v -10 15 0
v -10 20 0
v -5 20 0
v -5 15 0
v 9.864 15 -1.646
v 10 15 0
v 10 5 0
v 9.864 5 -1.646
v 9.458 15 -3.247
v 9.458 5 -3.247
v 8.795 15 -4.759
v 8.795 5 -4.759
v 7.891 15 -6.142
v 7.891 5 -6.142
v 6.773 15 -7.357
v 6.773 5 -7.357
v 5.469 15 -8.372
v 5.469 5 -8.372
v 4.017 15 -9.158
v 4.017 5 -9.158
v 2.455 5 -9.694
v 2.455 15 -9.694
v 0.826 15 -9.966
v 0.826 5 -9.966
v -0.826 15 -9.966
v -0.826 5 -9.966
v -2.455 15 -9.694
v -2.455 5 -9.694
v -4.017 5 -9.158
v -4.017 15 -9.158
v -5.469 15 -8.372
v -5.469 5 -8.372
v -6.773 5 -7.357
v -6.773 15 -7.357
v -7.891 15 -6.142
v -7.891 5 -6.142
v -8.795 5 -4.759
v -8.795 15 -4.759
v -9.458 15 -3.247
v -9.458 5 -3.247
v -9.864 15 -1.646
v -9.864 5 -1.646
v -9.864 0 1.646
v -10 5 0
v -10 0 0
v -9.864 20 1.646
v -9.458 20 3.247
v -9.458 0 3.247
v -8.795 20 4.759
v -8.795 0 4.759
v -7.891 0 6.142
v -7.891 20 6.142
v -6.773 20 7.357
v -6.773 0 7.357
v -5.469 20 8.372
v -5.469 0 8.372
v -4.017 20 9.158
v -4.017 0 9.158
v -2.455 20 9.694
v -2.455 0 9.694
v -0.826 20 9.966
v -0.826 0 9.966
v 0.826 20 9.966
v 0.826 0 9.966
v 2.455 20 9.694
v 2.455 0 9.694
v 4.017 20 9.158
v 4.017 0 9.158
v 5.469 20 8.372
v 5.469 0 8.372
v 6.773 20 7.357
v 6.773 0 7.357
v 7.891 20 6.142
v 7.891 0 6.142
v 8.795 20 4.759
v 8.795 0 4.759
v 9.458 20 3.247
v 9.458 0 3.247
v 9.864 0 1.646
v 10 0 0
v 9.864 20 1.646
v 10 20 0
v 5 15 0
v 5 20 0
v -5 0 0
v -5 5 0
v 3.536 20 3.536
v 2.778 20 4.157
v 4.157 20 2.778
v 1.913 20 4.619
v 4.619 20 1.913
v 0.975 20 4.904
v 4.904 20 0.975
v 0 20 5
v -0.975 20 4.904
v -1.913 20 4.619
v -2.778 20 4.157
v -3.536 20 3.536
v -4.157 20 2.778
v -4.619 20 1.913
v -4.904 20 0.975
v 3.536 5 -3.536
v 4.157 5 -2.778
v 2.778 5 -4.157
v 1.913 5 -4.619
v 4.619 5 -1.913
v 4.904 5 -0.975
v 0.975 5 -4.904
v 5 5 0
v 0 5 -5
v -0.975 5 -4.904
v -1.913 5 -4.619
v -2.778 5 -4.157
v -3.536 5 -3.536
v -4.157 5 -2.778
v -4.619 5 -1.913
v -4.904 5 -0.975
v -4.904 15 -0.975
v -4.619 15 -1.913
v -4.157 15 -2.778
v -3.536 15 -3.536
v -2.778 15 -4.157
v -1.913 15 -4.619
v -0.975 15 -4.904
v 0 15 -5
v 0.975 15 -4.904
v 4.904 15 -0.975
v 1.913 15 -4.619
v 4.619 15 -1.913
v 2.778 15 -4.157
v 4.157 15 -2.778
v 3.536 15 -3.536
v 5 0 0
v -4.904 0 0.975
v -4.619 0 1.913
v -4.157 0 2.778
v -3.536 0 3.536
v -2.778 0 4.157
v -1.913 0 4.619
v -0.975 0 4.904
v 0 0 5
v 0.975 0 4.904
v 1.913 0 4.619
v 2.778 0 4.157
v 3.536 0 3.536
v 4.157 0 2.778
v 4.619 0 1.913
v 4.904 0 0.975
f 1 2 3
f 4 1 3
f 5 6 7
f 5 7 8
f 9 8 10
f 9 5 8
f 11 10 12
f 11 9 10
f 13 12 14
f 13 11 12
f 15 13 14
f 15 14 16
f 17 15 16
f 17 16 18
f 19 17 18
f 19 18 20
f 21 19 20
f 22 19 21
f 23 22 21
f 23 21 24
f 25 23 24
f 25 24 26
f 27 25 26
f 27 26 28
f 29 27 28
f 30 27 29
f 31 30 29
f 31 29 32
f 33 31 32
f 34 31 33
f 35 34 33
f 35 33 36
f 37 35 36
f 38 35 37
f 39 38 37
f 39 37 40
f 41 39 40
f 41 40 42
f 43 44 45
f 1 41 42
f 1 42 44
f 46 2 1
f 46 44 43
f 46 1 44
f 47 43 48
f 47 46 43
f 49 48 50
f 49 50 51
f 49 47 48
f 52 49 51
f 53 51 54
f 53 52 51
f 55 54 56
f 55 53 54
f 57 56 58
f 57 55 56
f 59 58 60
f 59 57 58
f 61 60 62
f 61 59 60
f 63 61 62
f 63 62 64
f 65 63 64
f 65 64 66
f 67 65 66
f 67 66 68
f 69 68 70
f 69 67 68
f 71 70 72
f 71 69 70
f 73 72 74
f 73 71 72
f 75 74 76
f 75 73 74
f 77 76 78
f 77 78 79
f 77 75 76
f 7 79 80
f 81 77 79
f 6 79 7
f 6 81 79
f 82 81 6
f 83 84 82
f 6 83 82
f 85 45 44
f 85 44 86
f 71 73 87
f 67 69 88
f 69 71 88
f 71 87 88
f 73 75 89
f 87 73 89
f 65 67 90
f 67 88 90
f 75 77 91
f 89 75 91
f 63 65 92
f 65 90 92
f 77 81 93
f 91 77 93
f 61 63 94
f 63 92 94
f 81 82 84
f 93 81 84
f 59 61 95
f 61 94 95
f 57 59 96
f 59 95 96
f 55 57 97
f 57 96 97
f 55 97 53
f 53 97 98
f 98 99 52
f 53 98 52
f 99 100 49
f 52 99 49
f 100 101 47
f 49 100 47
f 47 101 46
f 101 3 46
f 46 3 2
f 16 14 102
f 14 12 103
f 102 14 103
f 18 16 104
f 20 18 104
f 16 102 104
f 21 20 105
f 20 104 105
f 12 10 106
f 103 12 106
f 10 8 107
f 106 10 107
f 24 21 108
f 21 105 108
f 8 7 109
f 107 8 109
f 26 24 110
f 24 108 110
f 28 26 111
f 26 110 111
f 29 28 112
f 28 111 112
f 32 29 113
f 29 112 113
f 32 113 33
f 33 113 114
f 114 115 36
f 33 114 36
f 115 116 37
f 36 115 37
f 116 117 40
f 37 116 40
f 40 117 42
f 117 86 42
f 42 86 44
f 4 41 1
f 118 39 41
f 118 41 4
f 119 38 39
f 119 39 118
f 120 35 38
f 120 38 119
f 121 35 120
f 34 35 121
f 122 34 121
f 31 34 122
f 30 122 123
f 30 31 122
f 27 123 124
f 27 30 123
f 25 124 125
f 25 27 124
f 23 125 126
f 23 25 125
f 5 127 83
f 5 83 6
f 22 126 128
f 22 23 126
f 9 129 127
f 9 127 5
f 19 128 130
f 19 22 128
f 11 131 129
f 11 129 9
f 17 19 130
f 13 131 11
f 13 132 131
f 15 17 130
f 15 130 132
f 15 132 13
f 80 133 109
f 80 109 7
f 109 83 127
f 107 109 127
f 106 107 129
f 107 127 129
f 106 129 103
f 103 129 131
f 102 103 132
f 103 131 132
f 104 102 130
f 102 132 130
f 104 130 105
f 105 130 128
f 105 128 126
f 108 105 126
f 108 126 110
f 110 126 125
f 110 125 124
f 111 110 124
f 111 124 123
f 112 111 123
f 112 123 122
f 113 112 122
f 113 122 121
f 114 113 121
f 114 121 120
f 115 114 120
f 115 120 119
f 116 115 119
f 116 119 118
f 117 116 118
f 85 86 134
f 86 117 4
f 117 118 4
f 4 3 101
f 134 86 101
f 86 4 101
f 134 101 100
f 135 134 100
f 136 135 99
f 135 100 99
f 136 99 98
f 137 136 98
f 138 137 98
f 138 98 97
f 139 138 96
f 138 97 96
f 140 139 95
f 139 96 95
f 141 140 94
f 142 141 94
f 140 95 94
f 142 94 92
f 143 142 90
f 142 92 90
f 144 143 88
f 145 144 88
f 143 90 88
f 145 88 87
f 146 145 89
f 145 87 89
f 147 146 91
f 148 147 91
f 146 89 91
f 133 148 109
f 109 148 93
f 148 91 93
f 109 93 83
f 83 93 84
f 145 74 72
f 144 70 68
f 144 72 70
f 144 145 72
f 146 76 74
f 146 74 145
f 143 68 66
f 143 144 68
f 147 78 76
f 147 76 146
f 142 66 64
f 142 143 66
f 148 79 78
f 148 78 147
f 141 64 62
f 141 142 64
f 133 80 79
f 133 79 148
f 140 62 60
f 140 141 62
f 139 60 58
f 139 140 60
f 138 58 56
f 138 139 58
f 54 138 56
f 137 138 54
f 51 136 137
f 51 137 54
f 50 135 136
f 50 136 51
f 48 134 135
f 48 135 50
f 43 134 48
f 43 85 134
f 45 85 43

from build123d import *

# Parameters (mm, degrees)
SKETCH1_W          = 10
SKETCH1_H          = 20
SKETCH2_R          = 5
CUT_EXTRUDE1_DEPTH = 20
CUT_EXTRUDE2_DEPTH = 5
CUT_EXTRUDE3_DEPTH = 5


with BuildPart() as part:
    # Sketch1 → Revolve1 (revolve)
    with BuildSketch(Plane.XY):
        with Locations((5, 10)):
            Rectangle(SKETCH1_W, SKETCH1_H)
    revolve(axis=Axis((0, 0, 0), (0, 1, 0)))

    # Sketch2 → Cut-Extrude1 (cut)
    with BuildSketch(Plane(origin=(0, 20, 0), x_dir=(1, 0, 0), z_dir=(0, 1, 0))):
        Circle(SKETCH2_R)
    extrude(amount=-CUT_EXTRUDE1_DEPTH, mode=Mode.SUBTRACT)

    # Sketch3 → Cut-Extrude2 (cut)
    with BuildSketch(Plane(origin=(0, 20, 0), x_dir=(1, 0, 0), z_dir=(0, 1, 0))):
        with BuildLine():
            Line((-10, 0), (-5, 0))
            ThreePointArc((-5, 0), (0, 5), (5, 0))
            Line((5, 0), (10, 0))
            ThreePointArc((10, 0), (0, 10), (-10, 0))
        make_face()
    extrude(amount=-CUT_EXTRUDE2_DEPTH, mode=Mode.SUBTRACT)

    # Sketch4 → Cut-Extrude3 (cut)
    with BuildSketch(Plane.XZ):
        with BuildLine():
            Line((-10, 0), (-5, 0))
            ThreePointArc((-5, 0), (0, -5), (5, 0))
            Line((5, 0), (10, 0))
            ThreePointArc((10, 0), (0, -10), (-10, 0))
        make_face()
    extrude(amount=-CUT_EXTRUDE3_DEPTH, mode=Mode.SUBTRACT)


solid = part.part
